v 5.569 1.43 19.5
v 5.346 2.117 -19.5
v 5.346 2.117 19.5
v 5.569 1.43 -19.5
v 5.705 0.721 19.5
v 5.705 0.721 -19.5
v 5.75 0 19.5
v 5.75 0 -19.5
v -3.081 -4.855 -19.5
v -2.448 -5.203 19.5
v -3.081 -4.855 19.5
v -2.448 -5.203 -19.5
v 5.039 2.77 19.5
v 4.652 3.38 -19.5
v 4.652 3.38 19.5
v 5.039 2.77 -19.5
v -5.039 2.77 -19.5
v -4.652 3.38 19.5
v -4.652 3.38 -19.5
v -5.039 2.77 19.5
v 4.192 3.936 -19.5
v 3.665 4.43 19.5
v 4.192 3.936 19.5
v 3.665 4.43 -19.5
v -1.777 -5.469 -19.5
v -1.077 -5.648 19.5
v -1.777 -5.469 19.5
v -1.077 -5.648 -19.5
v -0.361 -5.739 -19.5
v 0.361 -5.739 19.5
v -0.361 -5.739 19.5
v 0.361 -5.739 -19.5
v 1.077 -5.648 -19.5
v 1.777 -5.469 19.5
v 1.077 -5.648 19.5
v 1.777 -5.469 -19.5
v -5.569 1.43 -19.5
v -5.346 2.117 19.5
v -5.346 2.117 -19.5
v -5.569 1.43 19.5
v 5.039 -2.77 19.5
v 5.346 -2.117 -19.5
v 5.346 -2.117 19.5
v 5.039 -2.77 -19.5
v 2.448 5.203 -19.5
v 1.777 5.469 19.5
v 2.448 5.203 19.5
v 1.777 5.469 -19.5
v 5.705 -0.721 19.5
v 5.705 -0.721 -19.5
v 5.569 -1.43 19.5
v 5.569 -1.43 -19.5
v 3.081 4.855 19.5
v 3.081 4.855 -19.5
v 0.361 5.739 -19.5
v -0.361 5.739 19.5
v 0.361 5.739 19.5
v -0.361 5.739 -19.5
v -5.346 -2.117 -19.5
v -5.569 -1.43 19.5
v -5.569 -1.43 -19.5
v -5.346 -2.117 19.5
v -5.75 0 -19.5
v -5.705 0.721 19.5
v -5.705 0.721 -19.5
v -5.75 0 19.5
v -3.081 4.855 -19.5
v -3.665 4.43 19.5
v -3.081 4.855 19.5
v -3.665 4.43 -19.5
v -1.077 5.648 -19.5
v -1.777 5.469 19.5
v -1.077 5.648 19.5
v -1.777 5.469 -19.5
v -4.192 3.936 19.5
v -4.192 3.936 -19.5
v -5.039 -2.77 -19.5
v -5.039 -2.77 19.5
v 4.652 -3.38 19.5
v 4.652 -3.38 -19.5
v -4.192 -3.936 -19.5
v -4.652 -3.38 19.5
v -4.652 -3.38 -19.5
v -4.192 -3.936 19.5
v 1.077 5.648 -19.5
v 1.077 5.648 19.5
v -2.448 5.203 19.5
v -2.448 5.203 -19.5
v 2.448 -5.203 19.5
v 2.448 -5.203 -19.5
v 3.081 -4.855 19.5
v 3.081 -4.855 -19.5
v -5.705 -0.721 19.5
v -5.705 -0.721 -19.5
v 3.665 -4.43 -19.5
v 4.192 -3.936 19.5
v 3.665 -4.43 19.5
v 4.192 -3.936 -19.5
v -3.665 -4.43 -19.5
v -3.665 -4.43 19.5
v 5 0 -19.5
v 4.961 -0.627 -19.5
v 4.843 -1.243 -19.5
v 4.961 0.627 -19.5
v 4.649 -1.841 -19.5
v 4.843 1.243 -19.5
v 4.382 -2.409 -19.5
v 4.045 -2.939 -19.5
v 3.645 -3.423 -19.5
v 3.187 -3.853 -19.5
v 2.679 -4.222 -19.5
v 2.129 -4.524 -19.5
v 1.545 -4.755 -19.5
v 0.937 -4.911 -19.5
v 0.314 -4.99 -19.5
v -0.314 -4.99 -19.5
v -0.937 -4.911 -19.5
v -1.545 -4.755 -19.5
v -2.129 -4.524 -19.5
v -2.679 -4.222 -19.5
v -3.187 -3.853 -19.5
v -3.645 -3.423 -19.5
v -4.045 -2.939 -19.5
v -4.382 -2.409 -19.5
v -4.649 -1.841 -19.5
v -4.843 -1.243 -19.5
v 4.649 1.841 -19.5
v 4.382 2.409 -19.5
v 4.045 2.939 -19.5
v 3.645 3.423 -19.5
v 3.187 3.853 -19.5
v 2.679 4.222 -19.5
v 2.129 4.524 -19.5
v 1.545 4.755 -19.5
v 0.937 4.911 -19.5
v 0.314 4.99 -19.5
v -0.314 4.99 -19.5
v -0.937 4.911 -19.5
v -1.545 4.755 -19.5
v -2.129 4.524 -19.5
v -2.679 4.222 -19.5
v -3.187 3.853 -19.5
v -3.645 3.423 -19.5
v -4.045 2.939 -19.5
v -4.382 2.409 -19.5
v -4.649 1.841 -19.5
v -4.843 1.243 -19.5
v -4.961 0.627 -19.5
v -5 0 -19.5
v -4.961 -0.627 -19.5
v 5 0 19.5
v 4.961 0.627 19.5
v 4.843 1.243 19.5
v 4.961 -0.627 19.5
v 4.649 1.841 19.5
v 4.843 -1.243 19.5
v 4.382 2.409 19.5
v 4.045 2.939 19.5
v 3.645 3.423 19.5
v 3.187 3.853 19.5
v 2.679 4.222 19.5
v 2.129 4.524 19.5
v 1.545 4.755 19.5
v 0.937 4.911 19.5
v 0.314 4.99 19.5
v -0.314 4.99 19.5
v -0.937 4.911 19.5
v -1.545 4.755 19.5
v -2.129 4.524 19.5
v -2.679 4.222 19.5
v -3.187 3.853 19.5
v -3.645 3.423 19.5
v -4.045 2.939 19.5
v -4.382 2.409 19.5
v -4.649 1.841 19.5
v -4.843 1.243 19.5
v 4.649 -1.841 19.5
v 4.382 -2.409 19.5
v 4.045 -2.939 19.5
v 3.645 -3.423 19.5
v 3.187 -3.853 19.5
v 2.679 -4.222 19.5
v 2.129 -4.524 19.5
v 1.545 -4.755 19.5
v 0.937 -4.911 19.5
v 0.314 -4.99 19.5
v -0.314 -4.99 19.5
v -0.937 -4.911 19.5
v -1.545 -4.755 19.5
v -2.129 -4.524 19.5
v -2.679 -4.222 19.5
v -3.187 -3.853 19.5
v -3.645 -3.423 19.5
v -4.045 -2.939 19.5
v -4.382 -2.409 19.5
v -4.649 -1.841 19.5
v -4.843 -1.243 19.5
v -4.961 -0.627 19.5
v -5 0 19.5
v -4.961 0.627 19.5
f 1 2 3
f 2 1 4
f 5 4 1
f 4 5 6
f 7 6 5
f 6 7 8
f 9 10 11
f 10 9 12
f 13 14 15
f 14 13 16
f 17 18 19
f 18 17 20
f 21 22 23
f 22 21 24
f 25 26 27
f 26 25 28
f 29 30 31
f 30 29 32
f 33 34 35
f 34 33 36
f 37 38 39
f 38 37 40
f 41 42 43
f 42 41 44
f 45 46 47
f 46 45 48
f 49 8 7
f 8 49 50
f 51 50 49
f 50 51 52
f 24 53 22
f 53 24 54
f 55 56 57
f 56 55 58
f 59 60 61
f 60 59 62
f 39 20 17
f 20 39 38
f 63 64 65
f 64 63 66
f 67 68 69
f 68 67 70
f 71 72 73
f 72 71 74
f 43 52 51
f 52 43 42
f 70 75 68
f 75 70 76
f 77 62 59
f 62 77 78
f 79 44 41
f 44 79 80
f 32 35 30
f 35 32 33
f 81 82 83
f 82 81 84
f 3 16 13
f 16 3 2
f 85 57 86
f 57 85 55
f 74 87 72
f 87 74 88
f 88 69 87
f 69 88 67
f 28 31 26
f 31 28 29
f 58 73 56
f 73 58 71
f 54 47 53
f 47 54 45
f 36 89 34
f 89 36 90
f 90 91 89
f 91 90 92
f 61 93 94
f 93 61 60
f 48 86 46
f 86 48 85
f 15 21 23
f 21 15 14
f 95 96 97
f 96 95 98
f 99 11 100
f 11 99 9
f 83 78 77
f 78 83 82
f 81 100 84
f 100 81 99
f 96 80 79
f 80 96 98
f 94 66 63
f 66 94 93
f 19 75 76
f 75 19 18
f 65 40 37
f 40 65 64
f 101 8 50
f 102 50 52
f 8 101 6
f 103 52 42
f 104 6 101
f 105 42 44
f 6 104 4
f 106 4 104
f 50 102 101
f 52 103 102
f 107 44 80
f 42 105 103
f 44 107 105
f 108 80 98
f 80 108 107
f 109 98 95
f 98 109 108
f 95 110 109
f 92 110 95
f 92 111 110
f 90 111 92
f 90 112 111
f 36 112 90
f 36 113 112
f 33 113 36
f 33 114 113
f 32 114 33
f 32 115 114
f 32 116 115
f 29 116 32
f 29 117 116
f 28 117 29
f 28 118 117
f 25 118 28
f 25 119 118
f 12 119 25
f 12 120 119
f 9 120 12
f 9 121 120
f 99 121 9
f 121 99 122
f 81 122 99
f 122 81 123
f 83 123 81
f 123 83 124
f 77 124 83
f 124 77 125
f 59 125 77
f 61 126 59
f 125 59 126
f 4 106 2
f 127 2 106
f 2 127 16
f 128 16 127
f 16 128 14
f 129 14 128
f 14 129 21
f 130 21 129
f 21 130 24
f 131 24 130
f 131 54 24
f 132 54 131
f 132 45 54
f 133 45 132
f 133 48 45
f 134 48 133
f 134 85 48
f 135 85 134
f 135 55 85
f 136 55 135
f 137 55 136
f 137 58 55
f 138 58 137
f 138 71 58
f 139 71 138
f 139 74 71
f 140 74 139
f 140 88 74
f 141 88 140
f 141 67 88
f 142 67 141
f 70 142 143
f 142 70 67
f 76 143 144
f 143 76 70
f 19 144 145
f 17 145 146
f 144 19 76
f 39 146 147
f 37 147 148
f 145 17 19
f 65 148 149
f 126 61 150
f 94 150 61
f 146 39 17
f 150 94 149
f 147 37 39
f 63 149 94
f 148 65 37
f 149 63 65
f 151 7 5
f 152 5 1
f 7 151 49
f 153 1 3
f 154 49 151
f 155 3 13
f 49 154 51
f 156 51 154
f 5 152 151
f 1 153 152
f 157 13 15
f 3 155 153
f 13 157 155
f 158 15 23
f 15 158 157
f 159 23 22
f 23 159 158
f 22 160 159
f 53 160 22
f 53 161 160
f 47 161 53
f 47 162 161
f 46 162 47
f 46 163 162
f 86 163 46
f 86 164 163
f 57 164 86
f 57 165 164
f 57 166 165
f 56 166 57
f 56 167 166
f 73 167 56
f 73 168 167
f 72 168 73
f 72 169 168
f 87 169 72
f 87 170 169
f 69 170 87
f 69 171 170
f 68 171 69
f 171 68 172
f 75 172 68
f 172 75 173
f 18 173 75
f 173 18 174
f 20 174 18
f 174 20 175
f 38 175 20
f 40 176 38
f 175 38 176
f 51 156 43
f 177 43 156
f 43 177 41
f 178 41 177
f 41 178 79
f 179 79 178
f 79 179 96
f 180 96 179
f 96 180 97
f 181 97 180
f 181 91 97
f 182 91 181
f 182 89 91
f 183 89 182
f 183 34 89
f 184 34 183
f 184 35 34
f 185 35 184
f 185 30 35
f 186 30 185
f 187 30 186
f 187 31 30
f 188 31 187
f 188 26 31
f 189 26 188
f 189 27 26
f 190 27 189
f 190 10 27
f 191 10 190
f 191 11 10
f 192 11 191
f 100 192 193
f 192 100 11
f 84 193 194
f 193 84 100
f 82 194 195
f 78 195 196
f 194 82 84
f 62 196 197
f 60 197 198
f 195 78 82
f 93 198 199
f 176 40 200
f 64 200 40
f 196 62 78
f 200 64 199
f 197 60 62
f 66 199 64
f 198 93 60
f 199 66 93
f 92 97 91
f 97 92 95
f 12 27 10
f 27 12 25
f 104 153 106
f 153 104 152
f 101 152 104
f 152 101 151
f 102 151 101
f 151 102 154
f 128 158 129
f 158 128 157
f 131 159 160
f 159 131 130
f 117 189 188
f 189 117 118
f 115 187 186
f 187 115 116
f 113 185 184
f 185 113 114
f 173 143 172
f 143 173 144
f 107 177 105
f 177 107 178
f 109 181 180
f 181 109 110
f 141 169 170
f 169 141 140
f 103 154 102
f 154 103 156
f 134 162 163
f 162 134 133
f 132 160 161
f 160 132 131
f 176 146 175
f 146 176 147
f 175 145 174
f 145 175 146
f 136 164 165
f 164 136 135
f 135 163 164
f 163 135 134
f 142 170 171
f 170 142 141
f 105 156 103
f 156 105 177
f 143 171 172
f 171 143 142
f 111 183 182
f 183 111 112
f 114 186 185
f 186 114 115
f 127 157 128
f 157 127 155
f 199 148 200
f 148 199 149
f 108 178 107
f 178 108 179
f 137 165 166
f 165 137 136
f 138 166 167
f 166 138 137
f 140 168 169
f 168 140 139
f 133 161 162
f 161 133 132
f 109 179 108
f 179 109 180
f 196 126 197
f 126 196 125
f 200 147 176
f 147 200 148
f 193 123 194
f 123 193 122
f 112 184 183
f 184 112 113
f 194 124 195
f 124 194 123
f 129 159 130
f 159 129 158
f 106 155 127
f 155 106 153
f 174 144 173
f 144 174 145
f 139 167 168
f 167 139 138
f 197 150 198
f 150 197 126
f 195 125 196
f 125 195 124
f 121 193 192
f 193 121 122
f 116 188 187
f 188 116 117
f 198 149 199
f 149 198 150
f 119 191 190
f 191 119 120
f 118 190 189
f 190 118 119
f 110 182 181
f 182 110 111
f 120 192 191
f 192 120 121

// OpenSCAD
$fn = 50;


difference() {
	union() {
		translate(v = [0, 0, -19.5000000000]) {
			cylinder(h = 39, r = 5.7500000000);
		}
	}
	union() {
		translate(v = [0, 0, -100.0000000000]) {
			cylinder(h = 200, r = 5.0000000000);
		}
	}
}
